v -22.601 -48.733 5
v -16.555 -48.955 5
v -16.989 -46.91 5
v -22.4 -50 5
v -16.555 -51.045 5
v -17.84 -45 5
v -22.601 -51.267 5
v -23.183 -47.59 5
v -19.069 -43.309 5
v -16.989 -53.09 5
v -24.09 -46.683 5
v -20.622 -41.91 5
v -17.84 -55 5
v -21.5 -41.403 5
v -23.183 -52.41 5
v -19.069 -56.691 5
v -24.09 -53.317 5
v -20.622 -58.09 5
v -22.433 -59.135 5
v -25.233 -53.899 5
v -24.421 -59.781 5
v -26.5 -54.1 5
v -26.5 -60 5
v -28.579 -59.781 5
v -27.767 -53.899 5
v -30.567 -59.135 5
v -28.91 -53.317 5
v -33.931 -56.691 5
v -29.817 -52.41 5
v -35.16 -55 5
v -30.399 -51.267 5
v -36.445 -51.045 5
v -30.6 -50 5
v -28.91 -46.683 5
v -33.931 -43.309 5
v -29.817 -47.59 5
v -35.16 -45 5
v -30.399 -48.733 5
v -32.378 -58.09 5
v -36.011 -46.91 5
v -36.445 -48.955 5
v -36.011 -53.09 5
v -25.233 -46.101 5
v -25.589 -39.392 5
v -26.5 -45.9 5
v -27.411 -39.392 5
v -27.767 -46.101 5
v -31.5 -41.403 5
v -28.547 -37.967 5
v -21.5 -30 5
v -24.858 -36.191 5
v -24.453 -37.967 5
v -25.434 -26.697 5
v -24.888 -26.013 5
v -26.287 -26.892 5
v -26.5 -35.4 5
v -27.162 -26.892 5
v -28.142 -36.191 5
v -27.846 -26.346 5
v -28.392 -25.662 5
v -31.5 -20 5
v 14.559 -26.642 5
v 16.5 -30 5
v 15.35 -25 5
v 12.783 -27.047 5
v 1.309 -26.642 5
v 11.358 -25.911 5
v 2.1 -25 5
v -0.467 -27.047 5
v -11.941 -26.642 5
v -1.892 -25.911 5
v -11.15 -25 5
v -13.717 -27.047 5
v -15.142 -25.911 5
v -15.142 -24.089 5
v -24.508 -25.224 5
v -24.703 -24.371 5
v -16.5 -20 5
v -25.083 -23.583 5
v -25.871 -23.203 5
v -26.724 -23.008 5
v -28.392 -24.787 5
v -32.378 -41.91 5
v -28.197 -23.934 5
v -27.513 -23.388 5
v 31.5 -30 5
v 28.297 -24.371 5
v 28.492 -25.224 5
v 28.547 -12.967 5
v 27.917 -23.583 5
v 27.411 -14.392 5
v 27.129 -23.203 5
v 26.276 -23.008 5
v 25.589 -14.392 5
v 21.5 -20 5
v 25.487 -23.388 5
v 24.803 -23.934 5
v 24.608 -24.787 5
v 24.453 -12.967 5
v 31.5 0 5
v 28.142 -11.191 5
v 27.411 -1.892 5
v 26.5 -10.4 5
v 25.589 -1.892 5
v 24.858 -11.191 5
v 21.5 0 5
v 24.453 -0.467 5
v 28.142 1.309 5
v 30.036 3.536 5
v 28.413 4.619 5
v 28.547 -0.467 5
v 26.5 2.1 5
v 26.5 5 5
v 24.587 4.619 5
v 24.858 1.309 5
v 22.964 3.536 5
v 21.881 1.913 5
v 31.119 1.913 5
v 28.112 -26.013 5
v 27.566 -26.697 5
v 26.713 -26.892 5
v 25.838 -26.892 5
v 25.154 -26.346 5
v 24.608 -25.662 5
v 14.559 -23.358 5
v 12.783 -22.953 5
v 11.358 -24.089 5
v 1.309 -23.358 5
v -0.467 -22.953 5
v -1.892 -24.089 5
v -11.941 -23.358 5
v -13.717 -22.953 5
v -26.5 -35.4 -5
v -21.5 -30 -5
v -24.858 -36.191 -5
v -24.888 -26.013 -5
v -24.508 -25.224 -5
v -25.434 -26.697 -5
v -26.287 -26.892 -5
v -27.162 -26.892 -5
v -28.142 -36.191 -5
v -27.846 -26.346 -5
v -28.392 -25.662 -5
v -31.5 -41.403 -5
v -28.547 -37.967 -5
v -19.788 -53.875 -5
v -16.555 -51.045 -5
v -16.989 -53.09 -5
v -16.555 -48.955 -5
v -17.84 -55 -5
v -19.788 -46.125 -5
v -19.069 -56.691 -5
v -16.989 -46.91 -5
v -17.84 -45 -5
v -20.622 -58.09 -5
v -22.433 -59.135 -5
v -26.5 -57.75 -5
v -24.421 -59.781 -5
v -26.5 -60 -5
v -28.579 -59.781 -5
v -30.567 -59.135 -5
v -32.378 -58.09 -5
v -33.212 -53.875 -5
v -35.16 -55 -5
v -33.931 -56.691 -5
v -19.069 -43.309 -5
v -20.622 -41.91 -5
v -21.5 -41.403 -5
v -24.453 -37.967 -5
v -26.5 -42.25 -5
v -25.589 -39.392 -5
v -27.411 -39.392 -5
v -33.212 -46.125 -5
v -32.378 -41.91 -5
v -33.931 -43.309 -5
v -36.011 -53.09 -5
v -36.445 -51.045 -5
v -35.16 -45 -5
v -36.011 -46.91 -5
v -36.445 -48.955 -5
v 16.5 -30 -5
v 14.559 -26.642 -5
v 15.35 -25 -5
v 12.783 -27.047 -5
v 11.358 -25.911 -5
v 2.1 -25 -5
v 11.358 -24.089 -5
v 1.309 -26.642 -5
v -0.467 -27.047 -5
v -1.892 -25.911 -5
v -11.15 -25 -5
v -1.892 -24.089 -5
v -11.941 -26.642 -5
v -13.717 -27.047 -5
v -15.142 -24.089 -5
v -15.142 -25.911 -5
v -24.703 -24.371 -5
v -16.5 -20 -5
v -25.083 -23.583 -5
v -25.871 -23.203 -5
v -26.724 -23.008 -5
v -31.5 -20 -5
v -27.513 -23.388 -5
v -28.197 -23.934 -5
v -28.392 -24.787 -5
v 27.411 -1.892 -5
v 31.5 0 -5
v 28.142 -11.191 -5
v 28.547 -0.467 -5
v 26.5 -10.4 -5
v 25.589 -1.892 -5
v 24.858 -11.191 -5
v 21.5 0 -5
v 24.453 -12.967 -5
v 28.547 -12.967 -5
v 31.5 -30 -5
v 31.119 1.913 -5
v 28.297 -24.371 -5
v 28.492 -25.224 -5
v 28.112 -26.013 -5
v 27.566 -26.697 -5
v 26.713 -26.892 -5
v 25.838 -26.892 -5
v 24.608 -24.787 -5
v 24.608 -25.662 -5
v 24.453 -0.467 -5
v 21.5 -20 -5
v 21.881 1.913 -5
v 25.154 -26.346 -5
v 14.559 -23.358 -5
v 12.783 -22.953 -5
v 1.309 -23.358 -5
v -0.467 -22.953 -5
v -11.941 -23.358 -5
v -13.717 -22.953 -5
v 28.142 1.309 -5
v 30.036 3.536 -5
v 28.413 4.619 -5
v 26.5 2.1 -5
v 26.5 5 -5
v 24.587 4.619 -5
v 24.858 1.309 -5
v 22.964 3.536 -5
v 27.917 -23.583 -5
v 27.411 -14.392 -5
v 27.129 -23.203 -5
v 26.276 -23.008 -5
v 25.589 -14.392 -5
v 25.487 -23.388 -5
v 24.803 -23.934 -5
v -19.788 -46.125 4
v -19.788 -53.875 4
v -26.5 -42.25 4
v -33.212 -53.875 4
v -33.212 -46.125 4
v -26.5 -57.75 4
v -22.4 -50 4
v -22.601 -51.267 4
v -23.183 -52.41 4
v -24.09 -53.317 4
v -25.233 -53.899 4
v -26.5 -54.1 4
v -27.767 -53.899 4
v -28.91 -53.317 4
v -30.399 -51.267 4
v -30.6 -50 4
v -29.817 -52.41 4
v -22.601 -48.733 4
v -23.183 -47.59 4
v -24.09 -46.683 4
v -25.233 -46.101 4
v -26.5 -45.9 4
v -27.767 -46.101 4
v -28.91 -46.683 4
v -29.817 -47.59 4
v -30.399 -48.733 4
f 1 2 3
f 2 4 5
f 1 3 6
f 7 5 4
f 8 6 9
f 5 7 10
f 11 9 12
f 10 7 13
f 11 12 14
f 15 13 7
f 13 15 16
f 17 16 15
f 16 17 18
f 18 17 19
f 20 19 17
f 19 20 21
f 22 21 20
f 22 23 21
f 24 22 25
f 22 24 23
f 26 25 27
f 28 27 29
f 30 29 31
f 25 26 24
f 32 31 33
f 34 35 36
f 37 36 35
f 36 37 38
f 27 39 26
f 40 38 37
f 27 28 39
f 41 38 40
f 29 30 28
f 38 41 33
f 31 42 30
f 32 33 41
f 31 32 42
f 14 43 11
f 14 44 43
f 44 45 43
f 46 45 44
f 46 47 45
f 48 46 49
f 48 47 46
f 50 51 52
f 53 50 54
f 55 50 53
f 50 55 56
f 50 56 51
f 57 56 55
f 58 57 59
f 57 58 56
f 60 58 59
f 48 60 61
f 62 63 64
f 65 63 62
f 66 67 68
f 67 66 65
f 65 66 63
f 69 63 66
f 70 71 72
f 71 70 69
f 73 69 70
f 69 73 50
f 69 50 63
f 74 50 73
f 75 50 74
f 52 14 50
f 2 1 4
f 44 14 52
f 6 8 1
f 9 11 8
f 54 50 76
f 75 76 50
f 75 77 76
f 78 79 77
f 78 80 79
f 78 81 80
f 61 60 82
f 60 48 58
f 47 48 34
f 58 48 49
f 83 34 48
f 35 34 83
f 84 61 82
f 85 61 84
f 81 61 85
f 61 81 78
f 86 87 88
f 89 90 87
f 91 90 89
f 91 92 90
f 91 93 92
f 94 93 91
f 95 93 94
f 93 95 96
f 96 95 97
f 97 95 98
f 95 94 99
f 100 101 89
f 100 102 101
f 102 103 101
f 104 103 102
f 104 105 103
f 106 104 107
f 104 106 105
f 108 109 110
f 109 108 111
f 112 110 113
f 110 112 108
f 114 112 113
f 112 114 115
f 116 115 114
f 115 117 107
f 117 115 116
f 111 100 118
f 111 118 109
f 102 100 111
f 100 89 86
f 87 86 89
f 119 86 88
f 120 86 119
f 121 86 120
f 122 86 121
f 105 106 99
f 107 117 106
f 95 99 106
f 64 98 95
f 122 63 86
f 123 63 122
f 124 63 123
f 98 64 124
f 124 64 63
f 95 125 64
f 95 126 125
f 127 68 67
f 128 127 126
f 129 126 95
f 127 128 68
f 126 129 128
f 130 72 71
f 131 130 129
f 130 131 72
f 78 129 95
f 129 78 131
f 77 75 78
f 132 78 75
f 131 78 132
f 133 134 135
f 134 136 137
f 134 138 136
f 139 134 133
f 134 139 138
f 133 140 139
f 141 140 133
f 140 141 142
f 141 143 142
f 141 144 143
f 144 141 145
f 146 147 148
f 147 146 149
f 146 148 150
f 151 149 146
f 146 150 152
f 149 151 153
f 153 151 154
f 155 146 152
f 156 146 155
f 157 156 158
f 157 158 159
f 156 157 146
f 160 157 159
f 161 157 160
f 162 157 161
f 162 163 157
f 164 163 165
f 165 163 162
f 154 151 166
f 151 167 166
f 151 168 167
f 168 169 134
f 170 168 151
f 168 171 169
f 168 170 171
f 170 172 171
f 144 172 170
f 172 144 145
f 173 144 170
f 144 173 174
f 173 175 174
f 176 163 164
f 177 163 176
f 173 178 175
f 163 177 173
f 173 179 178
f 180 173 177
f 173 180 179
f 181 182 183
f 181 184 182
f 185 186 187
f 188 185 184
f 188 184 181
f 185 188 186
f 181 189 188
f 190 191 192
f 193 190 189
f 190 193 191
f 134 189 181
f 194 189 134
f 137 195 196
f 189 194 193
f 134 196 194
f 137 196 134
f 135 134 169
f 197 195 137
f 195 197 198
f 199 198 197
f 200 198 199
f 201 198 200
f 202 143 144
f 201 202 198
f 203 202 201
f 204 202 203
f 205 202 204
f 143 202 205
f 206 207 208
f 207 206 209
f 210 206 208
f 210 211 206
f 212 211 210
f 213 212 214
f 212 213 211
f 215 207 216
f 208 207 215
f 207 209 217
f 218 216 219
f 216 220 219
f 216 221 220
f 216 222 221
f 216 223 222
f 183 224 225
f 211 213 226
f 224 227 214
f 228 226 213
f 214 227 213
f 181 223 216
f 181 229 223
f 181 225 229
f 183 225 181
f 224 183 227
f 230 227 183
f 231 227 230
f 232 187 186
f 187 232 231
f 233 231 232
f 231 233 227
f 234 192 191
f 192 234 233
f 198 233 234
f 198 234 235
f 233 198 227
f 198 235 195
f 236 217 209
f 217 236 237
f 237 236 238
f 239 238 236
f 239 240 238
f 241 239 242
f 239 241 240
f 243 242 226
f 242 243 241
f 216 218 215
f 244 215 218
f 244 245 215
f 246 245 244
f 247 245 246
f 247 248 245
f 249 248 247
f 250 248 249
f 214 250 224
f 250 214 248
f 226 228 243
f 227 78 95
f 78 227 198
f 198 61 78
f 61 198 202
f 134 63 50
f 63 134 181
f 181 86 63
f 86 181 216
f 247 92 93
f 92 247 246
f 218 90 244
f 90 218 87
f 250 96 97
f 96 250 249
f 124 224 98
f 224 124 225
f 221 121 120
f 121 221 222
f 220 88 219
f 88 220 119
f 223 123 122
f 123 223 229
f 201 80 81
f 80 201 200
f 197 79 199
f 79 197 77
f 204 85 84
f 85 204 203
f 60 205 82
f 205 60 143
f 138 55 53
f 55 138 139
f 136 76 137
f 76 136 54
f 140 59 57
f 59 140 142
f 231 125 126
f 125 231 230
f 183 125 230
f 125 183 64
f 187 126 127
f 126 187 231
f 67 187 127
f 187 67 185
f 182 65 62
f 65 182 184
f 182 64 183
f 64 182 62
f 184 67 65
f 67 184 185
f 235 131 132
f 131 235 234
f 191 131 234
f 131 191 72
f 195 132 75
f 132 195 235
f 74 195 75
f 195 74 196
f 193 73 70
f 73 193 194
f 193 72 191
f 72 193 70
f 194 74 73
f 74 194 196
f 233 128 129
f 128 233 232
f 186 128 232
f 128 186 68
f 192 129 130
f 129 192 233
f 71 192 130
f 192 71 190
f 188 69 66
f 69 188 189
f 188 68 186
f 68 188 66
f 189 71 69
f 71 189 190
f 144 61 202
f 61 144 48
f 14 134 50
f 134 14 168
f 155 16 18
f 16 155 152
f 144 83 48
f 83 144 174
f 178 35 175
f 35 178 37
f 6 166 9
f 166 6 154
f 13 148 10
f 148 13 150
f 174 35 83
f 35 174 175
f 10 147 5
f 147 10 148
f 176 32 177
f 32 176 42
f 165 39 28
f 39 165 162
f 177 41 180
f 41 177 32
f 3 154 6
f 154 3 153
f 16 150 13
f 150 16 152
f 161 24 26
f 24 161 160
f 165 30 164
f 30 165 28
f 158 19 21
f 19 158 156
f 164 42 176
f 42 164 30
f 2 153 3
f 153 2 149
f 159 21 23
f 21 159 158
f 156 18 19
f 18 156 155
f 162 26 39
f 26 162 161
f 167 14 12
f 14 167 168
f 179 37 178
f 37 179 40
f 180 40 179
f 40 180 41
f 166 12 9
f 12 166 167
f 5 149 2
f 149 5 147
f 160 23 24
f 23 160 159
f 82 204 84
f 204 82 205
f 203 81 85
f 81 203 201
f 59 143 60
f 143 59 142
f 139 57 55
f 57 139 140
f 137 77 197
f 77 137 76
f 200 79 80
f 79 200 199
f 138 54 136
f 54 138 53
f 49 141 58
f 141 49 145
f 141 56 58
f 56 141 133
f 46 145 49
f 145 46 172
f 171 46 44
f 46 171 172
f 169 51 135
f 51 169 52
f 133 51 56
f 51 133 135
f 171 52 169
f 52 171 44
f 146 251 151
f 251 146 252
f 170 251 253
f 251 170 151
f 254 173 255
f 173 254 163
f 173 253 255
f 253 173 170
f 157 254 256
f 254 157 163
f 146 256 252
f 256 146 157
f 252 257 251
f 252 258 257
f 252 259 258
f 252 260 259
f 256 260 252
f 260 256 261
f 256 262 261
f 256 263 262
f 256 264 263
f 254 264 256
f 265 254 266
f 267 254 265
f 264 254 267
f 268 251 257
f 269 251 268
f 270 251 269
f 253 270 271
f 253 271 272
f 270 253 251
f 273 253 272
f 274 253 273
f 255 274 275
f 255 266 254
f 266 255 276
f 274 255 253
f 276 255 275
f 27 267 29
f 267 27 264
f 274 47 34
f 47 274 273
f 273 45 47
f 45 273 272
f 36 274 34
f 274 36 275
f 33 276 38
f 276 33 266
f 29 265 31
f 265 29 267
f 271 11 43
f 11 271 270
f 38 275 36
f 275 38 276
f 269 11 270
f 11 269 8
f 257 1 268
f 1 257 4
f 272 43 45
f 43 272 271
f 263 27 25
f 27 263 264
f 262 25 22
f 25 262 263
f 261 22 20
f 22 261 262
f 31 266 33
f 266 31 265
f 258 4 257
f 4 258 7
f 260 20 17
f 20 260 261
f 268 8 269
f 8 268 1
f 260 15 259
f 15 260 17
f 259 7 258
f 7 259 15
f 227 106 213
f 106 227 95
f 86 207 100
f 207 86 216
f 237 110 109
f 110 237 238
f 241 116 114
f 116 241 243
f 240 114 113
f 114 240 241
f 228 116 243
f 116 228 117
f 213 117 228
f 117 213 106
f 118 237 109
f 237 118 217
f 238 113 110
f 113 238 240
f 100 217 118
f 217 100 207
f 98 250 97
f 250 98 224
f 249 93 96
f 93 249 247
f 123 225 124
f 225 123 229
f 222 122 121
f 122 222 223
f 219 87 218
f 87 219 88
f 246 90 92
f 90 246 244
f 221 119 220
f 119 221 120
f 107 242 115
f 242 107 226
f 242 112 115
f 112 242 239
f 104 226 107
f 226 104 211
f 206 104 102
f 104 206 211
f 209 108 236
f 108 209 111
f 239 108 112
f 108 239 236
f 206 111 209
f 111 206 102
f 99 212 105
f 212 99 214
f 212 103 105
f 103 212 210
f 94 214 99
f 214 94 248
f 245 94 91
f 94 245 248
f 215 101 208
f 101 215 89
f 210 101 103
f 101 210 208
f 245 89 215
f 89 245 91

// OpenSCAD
espesor_pieza=10;
ancho_pieza=10;
longitud_tensor=50;
longitud_brazo=53;
longitud_brazo_suspension=50;


longitud_brazo_diagonal=sqrt(pow(longitud_brazo,2)+pow(longitud_brazo_suspension,2));

suspension();
//brazo_diagonal();
module suspension(){
	difference(){
		union(){
			//brazo principal HORIZONTAL
			translate([0,-longitud_brazo_suspension/2,0])
			brazo_horizontal();
			
			//brazo vertical
			translate([-longitud_brazo/2,-longitud_brazo_suspension/2,0])
			rotate([0,0,90])
			brazo_vertical();
			
			//brazo vertical

			translate([longitud_brazo/2,-longitud_brazo_suspension/2,0])
			rotate([0,0,90])
			brazo_vertical();
			
			
			//redondeo fin brazon ppal
			//translate([0,25,0])
			//cylinder(r=10/2, h=10, center=true);
			
			/*
			//brazo tensor
			translate([longitud_brazo/2,longitud_tensor/2,0])
			rotate([0,0,-90])
			brazotensor();			
			*/
			//placa apoyo
			//translate([(-longitud_brazo+ancho_pieza*2.5)/2,-ancho_pieza*1.5,-2.5])
			//cube([20,20,5], center=true);
		}

		translate([(-longitud_brazo)/2,,0,])
			cube([20,longitud_brazo_suspension-ancho_pieza,40], center=true);
		translate([(longitud_brazo)/2,-longitud_brazo_suspension +(ancho_pieza/4),0])
			cube([20,longitud_brazo_suspension/2+ancho_pieza,40], center=true);
	}
}

module brazotensor(){
	difference(){
		union(){
			cube([longitud_tensor,ancho_pieza ,espesor_pieza],center=true);
			translate([longitud_tensor/2,0,0])
			cylinder(r=ancho_pieza/2, h=espesor_pieza, center=true);
			translate([-longitud_tensor/2,0,0])
			cylinder(r=ancho_pieza/2, h=espesor_pieza, center=true);
		}
		translate([longitud_tensor/2,0,0])
		cylinder(r=4.2/2, h=20, center=true);
		translate([-longitud_tensor/2,0,0])
		cylinder(r=4.2/2, h=20, center=true);
	}

}

module brazo_horizontal(){
	difference(){
		union(){
			cube([longitud_brazo,ancho_pieza ,espesor_pieza],center=true);
			translate([longitud_brazo/2,0,0])
			cylinder(r=ancho_pieza/2, h=espesor_pieza, center=true);
			translate([-longitud_brazo/2,0,0])
			cylinder(r=ancho_pieza/2, h=espesor_pieza, center=true);
		}
		translate([longitud_brazo/2,0,0])
		cylinder(r=4.2/2, h=20, center=true);
		translate([-longitud_brazo/2,0,0])
		cylinder(r=4.2/2, h=20, center=true);
		translate([longitud_brazo/4,0,0])
		cylinder(r=4.2/2, h=20, center=true);
		translate([-longitud_brazo/4,0,0])
		cylinder(r=4.2/2, h=20, center=true);
		cylinder(r=4.2/2, h=20, center=true);
	}

}

module brazo_vertical(){
	difference(){
		union(){
			//eje principal y redondeo
			cube([longitud_brazo_suspension,ancho_pieza ,espesor_pieza],center=true);
			translate([longitud_brazo_suspension/2,0,0])
			cylinder(r=ancho_pieza/2, h=espesor_pieza, center=true);
			translate([-longitud_brazo_suspension/2,0,0])
			cylinder(r=ancho_pieza/2, h=espesor_pieza, center=true);
			//redondeo alojamiento tuerca
			translate([-longitud_brazo_suspension/2,0,0])
			cylinder(r=20/2, h=espesor_pieza, center=true);

			
		}
		cylinder(r=4.2/2, h=20, center=true);
		translate([longitud_brazo_suspension/2,0,0])
		cylinder(r=4.2/2, h=20, center=true);
		translate([-longitud_brazo_suspension/2,0,0])
		cylinder(r=4.2/2, h=20, center=true);
		translate([longitud_brazo_suspension/4,0,0])
		cylinder(r=4.2/2, h=20, center=true);
		translate([-longitud_brazo_suspension/4,0,0])
		cylinder(r=4.2/2, h=20, center=true);


		//ALOJAMIENTO TUERCA

		translate([-longitud_brazo_suspension/2,0,-espesor_pieza/2])
		cylinder(r=15.5/2, h=espesor_pieza-1,$fn=6);
		
		//EJE TUERCA
		
		translate([-longitud_brazo_suspension/2,0,0])
		cylinder(r=8.2/2, h=espesor_pieza*3,$fn=20);
	}

}

module brazo_diagonal(){
	difference(){
		union(){
			
			cube([longitud_brazo_diagonal,ancho_pieza ,espesor_pieza],center=true);
			translate([longitud_brazo_diagonal/2,0,0])
			cylinder(r=ancho_pieza/2, h=espesor_pieza, center=true);
			translate([-longitud_brazo_diagonal/2,0,0])
			cylinder(r=ancho_pieza/2, h=espesor_pieza, center=true);
		}
		translate([longitud_brazo_diagonal/2,0,0])
		cylinder(r=4.2/2, h=20, center=true);
		translate([-longitud_brazo_diagonal/2,0,0])
		cylinder(r=4.2/2, h=20, center=true);
		translate([longitud_brazo_diagonal/4,0,0])
		cylinder(r=4.2/2, h=20, center=true);
		translate([-longitud_brazo_diagonal/4,0,0])
		cylinder(r=4.2/2, h=20, center=true);
		cylinder(r=4.2/2, h=20, center=true);
	}

}


//brazotensor();
